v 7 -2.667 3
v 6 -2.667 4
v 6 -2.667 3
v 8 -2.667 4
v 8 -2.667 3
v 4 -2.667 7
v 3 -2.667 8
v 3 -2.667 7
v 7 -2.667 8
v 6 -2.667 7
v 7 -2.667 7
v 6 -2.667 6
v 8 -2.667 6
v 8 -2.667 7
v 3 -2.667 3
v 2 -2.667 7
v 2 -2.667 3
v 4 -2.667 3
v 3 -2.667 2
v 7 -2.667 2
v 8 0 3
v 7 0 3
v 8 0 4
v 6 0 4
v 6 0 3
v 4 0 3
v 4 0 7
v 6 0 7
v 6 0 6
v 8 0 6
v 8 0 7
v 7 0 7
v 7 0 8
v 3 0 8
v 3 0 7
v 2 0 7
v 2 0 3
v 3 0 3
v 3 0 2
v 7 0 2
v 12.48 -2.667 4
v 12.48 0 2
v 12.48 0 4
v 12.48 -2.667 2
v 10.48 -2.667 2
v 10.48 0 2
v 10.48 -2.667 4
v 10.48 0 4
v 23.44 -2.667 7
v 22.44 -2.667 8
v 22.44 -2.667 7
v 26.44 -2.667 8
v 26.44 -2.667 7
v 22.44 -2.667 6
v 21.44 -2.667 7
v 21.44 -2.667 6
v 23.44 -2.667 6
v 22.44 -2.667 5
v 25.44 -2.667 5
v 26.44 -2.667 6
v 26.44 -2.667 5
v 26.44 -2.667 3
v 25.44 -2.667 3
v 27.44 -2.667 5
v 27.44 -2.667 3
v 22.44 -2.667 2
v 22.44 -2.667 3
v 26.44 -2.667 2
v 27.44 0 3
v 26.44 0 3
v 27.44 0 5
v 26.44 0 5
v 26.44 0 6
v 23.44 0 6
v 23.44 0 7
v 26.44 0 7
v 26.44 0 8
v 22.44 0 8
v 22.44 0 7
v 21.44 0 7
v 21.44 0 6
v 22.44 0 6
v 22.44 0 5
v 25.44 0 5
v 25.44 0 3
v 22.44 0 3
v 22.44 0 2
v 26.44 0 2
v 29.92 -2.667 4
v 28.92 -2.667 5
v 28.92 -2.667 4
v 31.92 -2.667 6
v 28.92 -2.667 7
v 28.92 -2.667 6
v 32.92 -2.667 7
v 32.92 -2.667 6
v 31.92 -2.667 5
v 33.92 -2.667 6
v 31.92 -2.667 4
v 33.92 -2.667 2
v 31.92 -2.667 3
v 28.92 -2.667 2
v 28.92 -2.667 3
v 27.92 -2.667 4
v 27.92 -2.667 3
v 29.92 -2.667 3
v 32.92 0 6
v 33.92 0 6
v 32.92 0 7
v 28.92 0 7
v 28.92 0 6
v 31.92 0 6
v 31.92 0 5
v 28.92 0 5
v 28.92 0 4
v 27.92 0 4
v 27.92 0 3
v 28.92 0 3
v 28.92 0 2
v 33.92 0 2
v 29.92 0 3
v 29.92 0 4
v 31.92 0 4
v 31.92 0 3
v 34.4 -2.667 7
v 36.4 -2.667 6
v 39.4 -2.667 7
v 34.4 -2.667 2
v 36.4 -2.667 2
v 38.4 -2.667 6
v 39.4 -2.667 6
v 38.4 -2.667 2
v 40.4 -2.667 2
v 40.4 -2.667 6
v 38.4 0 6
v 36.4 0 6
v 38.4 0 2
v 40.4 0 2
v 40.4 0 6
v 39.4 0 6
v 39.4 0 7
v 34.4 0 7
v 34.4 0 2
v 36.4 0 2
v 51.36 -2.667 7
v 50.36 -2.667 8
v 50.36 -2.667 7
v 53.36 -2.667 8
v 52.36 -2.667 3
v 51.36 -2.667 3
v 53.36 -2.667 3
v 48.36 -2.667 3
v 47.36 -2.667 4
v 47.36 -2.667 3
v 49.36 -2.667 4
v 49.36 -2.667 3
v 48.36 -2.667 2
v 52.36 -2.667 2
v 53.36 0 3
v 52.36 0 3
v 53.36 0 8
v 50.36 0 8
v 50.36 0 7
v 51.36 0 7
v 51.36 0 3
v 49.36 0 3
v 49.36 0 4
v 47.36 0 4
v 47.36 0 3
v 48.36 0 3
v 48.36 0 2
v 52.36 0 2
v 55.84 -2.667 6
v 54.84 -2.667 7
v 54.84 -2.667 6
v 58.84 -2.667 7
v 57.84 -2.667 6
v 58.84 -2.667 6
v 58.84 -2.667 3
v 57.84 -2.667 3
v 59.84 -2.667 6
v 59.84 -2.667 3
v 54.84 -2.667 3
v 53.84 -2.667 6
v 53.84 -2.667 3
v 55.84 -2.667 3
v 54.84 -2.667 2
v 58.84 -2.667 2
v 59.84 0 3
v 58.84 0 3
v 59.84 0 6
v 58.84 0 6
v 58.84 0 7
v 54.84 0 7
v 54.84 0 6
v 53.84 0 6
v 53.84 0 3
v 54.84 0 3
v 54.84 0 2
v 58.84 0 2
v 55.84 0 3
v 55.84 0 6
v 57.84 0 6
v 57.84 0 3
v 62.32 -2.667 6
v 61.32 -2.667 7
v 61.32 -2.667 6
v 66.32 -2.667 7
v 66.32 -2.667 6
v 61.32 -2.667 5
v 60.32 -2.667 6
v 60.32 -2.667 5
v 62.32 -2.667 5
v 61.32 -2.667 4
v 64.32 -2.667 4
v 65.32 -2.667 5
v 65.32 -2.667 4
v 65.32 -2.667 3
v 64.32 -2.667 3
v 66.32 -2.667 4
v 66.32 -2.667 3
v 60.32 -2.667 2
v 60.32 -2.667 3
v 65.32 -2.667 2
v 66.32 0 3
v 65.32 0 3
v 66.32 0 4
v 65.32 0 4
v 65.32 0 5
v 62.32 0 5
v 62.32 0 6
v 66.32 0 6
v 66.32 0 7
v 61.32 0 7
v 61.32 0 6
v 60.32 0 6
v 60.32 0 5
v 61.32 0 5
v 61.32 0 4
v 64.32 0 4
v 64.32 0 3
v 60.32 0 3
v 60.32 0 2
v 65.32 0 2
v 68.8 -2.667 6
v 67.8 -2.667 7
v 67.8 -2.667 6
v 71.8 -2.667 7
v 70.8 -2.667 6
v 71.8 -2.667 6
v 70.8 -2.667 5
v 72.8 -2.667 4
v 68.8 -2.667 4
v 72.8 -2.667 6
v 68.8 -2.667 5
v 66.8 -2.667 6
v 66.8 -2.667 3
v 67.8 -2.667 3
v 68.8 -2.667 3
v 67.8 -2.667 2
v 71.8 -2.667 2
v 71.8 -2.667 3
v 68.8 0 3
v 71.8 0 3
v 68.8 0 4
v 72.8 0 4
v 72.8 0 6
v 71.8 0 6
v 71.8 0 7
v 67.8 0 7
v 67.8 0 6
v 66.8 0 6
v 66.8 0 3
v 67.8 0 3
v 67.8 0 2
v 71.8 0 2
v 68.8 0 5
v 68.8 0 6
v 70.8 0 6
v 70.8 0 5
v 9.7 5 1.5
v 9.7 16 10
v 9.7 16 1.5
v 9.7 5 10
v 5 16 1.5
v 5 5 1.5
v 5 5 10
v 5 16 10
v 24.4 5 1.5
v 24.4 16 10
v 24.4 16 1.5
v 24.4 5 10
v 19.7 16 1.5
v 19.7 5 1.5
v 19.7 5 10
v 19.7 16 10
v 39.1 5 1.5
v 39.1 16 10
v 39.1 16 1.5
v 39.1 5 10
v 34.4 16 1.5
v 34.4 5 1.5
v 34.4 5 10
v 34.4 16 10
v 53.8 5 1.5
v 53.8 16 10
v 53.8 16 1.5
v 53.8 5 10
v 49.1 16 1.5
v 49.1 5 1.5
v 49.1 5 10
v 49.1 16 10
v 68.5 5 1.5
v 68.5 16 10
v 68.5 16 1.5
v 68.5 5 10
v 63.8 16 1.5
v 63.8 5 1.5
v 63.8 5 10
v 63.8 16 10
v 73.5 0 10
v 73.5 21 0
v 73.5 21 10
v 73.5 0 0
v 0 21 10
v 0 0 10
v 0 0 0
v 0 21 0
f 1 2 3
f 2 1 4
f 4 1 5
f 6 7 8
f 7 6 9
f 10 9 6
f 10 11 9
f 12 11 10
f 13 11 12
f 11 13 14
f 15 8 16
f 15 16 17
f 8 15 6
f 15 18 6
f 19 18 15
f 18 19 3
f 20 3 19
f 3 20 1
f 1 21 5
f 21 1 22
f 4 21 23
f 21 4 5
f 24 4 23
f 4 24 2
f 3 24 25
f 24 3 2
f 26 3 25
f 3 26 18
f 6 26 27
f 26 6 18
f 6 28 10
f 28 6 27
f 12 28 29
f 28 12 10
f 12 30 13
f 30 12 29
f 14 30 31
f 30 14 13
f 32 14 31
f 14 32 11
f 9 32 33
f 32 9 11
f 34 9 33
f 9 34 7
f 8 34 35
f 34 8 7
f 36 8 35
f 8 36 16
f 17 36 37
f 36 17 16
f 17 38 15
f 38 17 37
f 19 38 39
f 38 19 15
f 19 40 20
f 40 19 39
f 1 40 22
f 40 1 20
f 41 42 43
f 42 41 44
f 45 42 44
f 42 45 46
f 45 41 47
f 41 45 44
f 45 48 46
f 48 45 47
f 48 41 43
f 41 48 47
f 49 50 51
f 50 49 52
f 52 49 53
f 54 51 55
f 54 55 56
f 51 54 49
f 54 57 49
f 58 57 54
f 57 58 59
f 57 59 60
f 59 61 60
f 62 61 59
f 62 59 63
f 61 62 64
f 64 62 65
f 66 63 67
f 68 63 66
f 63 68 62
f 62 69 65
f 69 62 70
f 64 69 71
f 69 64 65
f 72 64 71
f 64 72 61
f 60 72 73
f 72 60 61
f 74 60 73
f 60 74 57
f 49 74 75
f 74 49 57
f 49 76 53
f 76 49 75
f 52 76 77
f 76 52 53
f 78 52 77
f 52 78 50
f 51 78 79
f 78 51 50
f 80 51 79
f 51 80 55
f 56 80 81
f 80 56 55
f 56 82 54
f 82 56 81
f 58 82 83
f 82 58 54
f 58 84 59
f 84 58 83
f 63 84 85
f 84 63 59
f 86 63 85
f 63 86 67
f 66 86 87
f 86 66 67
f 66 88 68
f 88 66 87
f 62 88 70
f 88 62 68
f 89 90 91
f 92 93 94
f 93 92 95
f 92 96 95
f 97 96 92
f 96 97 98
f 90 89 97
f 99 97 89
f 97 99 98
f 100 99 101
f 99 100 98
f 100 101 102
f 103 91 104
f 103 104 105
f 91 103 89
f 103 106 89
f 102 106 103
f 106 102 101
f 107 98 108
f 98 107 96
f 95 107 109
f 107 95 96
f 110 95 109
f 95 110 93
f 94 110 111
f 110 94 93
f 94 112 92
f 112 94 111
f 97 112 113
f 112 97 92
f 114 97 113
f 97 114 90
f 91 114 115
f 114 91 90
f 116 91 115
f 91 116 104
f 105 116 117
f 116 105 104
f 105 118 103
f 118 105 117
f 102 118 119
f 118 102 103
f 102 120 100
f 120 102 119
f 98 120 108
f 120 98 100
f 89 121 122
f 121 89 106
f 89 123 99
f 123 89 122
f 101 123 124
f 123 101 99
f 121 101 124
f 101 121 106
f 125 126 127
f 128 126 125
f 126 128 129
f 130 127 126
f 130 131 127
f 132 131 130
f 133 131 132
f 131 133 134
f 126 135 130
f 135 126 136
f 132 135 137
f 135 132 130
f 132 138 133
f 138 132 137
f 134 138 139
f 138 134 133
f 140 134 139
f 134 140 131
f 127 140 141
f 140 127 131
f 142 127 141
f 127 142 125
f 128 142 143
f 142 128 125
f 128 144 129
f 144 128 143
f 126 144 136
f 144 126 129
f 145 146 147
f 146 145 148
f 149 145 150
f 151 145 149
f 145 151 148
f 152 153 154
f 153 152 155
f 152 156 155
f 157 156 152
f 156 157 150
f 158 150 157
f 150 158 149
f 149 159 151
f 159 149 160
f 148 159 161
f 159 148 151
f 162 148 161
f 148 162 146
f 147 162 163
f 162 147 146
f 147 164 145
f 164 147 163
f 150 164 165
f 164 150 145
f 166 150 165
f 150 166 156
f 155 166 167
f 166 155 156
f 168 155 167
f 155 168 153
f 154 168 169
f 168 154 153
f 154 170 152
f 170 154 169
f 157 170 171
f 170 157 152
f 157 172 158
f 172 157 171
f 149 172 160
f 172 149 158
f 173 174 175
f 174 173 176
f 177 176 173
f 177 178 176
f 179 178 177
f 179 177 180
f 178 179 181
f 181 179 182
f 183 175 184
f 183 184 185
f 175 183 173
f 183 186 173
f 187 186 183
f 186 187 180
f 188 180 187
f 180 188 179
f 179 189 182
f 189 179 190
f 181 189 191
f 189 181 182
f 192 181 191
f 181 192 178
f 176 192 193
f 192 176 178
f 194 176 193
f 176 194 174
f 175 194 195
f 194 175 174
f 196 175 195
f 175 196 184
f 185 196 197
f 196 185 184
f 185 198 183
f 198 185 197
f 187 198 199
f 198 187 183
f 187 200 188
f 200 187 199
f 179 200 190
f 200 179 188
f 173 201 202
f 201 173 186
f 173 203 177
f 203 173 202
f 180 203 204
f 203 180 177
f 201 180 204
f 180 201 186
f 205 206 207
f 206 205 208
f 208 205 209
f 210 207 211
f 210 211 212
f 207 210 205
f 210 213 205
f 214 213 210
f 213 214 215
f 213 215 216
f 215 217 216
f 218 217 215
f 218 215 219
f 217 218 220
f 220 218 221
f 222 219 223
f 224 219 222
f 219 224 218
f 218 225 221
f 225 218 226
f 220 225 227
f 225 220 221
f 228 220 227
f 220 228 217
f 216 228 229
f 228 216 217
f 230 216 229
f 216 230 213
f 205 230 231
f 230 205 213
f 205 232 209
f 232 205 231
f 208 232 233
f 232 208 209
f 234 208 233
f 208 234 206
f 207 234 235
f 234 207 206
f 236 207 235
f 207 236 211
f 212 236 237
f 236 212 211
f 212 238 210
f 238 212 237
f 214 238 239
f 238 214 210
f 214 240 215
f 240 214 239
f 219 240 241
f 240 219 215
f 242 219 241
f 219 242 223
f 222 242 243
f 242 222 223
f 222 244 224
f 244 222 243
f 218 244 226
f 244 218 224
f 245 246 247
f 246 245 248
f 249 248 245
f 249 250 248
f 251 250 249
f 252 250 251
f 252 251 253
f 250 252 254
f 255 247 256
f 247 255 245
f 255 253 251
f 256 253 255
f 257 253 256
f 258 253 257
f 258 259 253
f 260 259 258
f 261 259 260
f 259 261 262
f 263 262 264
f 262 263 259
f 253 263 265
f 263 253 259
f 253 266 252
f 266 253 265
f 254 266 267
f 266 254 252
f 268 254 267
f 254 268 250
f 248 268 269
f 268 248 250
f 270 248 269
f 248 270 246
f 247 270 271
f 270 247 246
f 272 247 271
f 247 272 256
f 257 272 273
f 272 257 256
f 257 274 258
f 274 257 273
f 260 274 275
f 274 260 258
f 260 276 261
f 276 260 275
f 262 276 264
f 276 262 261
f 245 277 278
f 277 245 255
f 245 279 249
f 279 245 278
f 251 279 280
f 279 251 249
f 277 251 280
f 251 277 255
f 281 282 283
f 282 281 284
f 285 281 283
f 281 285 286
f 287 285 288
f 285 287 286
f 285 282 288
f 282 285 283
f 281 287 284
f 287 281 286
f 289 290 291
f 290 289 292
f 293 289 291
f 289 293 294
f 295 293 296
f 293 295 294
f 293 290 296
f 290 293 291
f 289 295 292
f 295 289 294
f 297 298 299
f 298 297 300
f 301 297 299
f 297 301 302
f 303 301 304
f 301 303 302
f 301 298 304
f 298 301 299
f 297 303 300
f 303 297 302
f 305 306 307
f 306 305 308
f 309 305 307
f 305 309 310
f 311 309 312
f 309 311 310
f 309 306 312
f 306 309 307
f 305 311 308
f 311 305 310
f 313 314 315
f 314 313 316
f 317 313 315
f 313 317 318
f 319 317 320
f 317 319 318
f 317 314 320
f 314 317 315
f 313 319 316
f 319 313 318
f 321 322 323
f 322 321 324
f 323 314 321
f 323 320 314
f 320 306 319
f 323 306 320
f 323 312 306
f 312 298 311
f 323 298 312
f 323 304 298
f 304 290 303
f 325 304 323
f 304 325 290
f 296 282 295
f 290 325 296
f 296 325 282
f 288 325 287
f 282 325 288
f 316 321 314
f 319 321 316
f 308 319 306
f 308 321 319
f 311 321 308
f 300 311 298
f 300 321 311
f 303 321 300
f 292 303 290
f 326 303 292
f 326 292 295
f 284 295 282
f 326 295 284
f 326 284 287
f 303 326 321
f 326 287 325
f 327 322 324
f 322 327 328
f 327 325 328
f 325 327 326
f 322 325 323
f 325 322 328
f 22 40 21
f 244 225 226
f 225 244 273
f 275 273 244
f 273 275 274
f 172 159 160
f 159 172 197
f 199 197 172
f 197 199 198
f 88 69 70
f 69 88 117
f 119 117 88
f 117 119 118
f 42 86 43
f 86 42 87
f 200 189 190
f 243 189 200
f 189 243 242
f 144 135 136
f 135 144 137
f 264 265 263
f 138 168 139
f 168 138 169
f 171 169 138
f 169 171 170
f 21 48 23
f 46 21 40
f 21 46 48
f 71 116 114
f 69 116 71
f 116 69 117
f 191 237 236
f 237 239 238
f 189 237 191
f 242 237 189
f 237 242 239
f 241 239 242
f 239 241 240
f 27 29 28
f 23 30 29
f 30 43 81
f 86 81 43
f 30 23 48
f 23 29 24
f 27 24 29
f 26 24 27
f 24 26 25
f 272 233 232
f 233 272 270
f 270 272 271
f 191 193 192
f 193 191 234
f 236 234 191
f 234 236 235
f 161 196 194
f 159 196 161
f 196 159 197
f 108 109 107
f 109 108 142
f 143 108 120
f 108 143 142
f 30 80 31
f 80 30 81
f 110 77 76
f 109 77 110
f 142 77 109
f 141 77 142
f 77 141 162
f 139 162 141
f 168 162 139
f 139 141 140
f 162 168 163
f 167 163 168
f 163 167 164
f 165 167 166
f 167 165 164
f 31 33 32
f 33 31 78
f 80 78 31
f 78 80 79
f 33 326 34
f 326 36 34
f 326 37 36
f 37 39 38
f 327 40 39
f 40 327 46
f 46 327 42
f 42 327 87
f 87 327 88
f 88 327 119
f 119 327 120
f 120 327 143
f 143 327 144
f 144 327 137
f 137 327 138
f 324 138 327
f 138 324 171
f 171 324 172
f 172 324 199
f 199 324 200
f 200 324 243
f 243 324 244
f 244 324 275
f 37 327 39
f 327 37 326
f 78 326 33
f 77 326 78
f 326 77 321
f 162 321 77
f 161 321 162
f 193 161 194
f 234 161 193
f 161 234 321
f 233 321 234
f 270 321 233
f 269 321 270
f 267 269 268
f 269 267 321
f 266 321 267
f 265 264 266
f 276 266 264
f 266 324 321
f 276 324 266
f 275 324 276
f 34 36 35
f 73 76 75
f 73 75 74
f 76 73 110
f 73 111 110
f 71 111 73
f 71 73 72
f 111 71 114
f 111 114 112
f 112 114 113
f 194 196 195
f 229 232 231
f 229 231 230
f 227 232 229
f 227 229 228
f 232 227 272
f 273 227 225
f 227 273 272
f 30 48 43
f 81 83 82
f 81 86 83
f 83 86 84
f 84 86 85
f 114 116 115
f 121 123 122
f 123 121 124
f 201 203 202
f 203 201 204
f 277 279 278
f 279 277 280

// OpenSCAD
use <MCAD/fonts.scad>

module agujero(){

cube(size=[4.7,11,10]);
}


module portaPD(nAg){
	longX = 5*2+(4.7+10)*(nAg-1)+4.7;
	difference(){
		cube(size=[longX,21,10]);

		for ( i = [0:nAg-1 ] )
		{
			translate([5+i*14.7,5,1.5])agujero(); 
		}
	}
}



module portaPDtxt(word, font_scale, font_spacing, nAg )
{
longX = 5*2+(4.7+10)*(nAg-1)+4.7;
thisFont=8bit_polyfont();
x_shift=thisFont[0][0] * font_spacing;
y_shift=thisFont[0][1];

	theseIndicies=search(word,thisFont[2],1,1);
	wordlength = (len(theseIndicies))* x_shift;
	


	union() {

// Create the Text //
		translate([0,-y_shift/3,5])
		rotate(a=[90,0,0]) 
		scale([font_scale,font_scale,1]){
			for( j=[0:(len(theseIndicies)-1)] ) 
				translate([ j*x_shift + 1, -y_shift/2 ,-10/2]) 
				{
					linear_extrude(height=10/2) polygon(points=thisFont[2][theseIndicies[j]][6][0],paths=thisFont[2][theseIndicies[j]][6][1]);
				}
		}
			
// Main body
			portaPD(nAg);
	}


}
portaPDtxt("C. San Jose" , 1, 0.81, 5 );
